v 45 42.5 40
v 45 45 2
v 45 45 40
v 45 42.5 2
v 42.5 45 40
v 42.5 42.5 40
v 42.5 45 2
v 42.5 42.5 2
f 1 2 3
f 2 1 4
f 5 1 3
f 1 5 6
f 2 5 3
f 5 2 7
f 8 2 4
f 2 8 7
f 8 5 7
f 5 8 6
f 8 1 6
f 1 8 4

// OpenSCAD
// DIY magnetic stirrer housing - print orientation (upside down)
// Units: mm. Print orientation: top plate on bed (z = 0), walls rise to z = 40.

// ---------------- Parameters ----------------
plate_t      = 2;     // top plate thickness
wall_t       = 2.5;   // wall thickness
box_h        = 40;    // total height of box (open top at z = box_h)
outer_x      = 90;    // outer size in X
outer_y      = 90;    // outer size in Y
screw_d      = 4.5;   // M4 screw hole diameter
screw_pitch  = 71.5;  // square pitch of screw holes (centre to centre)
notch_w      = 12;    // cable notch width (along wall)
notch_depth  = 8;     // notch depth from open edge (z = box_h - notch_depth)
eps          = 0.5;   // cutter overshoot past faces

$fn = 96;

// ---------------- Model ----------------
difference() {
    // Main box body: solid block with open top
    translate([-outer_x/2, -outer_y/2, 0])
        cube([outer_x, outer_y, box_h]);

    // Top plate (thick, forms the stirring surface when flipped)
    translate([-outer_x/2, -outer_y/2, 0])
        cube([outer_x, outer_y, plate_t]);

    // Four walls, each with a small window cut near the open top
    // Wall along +X, running Y - to +
    translate([-outer_x/2 + wall_t, -outer_y/2, 0])
        cube([outer_x - 2*wall_t, outer_y, box_h]);

    // Wall along -X, running Y - to +
    translate([-outer_x/2, -outer_y/2, 0])
        cube([outer_x - 2*wall_t, outer_y, box_h]);

    // Wall along +Y, running X - to +
    translate([-outer_x/2, -outer_y/2 + wall_t, 0])
        cube([outer_x, outer_y - 2*wall_t, box_h]);

    // Wall along -Y, running X - to +
    translate([-outer_x/2, -outer_y/2, 0])
        cube([outer_x, outer_y - 2*wall_t, box_h]);

    // Screw holes through the top plate, on a centred square pattern
    for (i = [0:3]) {
        rotate([0, 0, i*90])
            translate([0, 0, -eps])
                cylinder(d = screw_d, h = plate_t + 2*eps);
    }

    // Cable notch in one wall: 12 mm wide, centred along the wall,
    // reaching 8 mm down from the open edge (z = 32 to z = 40)
    translate([-outer_x/2 + wall_t, -outer_y/2 + outer_y/2 - notch_w/2,
               box_h - notch_depth])
        cube([notch_w, outer_y - 2*wall_t, notch_depth]);
}
